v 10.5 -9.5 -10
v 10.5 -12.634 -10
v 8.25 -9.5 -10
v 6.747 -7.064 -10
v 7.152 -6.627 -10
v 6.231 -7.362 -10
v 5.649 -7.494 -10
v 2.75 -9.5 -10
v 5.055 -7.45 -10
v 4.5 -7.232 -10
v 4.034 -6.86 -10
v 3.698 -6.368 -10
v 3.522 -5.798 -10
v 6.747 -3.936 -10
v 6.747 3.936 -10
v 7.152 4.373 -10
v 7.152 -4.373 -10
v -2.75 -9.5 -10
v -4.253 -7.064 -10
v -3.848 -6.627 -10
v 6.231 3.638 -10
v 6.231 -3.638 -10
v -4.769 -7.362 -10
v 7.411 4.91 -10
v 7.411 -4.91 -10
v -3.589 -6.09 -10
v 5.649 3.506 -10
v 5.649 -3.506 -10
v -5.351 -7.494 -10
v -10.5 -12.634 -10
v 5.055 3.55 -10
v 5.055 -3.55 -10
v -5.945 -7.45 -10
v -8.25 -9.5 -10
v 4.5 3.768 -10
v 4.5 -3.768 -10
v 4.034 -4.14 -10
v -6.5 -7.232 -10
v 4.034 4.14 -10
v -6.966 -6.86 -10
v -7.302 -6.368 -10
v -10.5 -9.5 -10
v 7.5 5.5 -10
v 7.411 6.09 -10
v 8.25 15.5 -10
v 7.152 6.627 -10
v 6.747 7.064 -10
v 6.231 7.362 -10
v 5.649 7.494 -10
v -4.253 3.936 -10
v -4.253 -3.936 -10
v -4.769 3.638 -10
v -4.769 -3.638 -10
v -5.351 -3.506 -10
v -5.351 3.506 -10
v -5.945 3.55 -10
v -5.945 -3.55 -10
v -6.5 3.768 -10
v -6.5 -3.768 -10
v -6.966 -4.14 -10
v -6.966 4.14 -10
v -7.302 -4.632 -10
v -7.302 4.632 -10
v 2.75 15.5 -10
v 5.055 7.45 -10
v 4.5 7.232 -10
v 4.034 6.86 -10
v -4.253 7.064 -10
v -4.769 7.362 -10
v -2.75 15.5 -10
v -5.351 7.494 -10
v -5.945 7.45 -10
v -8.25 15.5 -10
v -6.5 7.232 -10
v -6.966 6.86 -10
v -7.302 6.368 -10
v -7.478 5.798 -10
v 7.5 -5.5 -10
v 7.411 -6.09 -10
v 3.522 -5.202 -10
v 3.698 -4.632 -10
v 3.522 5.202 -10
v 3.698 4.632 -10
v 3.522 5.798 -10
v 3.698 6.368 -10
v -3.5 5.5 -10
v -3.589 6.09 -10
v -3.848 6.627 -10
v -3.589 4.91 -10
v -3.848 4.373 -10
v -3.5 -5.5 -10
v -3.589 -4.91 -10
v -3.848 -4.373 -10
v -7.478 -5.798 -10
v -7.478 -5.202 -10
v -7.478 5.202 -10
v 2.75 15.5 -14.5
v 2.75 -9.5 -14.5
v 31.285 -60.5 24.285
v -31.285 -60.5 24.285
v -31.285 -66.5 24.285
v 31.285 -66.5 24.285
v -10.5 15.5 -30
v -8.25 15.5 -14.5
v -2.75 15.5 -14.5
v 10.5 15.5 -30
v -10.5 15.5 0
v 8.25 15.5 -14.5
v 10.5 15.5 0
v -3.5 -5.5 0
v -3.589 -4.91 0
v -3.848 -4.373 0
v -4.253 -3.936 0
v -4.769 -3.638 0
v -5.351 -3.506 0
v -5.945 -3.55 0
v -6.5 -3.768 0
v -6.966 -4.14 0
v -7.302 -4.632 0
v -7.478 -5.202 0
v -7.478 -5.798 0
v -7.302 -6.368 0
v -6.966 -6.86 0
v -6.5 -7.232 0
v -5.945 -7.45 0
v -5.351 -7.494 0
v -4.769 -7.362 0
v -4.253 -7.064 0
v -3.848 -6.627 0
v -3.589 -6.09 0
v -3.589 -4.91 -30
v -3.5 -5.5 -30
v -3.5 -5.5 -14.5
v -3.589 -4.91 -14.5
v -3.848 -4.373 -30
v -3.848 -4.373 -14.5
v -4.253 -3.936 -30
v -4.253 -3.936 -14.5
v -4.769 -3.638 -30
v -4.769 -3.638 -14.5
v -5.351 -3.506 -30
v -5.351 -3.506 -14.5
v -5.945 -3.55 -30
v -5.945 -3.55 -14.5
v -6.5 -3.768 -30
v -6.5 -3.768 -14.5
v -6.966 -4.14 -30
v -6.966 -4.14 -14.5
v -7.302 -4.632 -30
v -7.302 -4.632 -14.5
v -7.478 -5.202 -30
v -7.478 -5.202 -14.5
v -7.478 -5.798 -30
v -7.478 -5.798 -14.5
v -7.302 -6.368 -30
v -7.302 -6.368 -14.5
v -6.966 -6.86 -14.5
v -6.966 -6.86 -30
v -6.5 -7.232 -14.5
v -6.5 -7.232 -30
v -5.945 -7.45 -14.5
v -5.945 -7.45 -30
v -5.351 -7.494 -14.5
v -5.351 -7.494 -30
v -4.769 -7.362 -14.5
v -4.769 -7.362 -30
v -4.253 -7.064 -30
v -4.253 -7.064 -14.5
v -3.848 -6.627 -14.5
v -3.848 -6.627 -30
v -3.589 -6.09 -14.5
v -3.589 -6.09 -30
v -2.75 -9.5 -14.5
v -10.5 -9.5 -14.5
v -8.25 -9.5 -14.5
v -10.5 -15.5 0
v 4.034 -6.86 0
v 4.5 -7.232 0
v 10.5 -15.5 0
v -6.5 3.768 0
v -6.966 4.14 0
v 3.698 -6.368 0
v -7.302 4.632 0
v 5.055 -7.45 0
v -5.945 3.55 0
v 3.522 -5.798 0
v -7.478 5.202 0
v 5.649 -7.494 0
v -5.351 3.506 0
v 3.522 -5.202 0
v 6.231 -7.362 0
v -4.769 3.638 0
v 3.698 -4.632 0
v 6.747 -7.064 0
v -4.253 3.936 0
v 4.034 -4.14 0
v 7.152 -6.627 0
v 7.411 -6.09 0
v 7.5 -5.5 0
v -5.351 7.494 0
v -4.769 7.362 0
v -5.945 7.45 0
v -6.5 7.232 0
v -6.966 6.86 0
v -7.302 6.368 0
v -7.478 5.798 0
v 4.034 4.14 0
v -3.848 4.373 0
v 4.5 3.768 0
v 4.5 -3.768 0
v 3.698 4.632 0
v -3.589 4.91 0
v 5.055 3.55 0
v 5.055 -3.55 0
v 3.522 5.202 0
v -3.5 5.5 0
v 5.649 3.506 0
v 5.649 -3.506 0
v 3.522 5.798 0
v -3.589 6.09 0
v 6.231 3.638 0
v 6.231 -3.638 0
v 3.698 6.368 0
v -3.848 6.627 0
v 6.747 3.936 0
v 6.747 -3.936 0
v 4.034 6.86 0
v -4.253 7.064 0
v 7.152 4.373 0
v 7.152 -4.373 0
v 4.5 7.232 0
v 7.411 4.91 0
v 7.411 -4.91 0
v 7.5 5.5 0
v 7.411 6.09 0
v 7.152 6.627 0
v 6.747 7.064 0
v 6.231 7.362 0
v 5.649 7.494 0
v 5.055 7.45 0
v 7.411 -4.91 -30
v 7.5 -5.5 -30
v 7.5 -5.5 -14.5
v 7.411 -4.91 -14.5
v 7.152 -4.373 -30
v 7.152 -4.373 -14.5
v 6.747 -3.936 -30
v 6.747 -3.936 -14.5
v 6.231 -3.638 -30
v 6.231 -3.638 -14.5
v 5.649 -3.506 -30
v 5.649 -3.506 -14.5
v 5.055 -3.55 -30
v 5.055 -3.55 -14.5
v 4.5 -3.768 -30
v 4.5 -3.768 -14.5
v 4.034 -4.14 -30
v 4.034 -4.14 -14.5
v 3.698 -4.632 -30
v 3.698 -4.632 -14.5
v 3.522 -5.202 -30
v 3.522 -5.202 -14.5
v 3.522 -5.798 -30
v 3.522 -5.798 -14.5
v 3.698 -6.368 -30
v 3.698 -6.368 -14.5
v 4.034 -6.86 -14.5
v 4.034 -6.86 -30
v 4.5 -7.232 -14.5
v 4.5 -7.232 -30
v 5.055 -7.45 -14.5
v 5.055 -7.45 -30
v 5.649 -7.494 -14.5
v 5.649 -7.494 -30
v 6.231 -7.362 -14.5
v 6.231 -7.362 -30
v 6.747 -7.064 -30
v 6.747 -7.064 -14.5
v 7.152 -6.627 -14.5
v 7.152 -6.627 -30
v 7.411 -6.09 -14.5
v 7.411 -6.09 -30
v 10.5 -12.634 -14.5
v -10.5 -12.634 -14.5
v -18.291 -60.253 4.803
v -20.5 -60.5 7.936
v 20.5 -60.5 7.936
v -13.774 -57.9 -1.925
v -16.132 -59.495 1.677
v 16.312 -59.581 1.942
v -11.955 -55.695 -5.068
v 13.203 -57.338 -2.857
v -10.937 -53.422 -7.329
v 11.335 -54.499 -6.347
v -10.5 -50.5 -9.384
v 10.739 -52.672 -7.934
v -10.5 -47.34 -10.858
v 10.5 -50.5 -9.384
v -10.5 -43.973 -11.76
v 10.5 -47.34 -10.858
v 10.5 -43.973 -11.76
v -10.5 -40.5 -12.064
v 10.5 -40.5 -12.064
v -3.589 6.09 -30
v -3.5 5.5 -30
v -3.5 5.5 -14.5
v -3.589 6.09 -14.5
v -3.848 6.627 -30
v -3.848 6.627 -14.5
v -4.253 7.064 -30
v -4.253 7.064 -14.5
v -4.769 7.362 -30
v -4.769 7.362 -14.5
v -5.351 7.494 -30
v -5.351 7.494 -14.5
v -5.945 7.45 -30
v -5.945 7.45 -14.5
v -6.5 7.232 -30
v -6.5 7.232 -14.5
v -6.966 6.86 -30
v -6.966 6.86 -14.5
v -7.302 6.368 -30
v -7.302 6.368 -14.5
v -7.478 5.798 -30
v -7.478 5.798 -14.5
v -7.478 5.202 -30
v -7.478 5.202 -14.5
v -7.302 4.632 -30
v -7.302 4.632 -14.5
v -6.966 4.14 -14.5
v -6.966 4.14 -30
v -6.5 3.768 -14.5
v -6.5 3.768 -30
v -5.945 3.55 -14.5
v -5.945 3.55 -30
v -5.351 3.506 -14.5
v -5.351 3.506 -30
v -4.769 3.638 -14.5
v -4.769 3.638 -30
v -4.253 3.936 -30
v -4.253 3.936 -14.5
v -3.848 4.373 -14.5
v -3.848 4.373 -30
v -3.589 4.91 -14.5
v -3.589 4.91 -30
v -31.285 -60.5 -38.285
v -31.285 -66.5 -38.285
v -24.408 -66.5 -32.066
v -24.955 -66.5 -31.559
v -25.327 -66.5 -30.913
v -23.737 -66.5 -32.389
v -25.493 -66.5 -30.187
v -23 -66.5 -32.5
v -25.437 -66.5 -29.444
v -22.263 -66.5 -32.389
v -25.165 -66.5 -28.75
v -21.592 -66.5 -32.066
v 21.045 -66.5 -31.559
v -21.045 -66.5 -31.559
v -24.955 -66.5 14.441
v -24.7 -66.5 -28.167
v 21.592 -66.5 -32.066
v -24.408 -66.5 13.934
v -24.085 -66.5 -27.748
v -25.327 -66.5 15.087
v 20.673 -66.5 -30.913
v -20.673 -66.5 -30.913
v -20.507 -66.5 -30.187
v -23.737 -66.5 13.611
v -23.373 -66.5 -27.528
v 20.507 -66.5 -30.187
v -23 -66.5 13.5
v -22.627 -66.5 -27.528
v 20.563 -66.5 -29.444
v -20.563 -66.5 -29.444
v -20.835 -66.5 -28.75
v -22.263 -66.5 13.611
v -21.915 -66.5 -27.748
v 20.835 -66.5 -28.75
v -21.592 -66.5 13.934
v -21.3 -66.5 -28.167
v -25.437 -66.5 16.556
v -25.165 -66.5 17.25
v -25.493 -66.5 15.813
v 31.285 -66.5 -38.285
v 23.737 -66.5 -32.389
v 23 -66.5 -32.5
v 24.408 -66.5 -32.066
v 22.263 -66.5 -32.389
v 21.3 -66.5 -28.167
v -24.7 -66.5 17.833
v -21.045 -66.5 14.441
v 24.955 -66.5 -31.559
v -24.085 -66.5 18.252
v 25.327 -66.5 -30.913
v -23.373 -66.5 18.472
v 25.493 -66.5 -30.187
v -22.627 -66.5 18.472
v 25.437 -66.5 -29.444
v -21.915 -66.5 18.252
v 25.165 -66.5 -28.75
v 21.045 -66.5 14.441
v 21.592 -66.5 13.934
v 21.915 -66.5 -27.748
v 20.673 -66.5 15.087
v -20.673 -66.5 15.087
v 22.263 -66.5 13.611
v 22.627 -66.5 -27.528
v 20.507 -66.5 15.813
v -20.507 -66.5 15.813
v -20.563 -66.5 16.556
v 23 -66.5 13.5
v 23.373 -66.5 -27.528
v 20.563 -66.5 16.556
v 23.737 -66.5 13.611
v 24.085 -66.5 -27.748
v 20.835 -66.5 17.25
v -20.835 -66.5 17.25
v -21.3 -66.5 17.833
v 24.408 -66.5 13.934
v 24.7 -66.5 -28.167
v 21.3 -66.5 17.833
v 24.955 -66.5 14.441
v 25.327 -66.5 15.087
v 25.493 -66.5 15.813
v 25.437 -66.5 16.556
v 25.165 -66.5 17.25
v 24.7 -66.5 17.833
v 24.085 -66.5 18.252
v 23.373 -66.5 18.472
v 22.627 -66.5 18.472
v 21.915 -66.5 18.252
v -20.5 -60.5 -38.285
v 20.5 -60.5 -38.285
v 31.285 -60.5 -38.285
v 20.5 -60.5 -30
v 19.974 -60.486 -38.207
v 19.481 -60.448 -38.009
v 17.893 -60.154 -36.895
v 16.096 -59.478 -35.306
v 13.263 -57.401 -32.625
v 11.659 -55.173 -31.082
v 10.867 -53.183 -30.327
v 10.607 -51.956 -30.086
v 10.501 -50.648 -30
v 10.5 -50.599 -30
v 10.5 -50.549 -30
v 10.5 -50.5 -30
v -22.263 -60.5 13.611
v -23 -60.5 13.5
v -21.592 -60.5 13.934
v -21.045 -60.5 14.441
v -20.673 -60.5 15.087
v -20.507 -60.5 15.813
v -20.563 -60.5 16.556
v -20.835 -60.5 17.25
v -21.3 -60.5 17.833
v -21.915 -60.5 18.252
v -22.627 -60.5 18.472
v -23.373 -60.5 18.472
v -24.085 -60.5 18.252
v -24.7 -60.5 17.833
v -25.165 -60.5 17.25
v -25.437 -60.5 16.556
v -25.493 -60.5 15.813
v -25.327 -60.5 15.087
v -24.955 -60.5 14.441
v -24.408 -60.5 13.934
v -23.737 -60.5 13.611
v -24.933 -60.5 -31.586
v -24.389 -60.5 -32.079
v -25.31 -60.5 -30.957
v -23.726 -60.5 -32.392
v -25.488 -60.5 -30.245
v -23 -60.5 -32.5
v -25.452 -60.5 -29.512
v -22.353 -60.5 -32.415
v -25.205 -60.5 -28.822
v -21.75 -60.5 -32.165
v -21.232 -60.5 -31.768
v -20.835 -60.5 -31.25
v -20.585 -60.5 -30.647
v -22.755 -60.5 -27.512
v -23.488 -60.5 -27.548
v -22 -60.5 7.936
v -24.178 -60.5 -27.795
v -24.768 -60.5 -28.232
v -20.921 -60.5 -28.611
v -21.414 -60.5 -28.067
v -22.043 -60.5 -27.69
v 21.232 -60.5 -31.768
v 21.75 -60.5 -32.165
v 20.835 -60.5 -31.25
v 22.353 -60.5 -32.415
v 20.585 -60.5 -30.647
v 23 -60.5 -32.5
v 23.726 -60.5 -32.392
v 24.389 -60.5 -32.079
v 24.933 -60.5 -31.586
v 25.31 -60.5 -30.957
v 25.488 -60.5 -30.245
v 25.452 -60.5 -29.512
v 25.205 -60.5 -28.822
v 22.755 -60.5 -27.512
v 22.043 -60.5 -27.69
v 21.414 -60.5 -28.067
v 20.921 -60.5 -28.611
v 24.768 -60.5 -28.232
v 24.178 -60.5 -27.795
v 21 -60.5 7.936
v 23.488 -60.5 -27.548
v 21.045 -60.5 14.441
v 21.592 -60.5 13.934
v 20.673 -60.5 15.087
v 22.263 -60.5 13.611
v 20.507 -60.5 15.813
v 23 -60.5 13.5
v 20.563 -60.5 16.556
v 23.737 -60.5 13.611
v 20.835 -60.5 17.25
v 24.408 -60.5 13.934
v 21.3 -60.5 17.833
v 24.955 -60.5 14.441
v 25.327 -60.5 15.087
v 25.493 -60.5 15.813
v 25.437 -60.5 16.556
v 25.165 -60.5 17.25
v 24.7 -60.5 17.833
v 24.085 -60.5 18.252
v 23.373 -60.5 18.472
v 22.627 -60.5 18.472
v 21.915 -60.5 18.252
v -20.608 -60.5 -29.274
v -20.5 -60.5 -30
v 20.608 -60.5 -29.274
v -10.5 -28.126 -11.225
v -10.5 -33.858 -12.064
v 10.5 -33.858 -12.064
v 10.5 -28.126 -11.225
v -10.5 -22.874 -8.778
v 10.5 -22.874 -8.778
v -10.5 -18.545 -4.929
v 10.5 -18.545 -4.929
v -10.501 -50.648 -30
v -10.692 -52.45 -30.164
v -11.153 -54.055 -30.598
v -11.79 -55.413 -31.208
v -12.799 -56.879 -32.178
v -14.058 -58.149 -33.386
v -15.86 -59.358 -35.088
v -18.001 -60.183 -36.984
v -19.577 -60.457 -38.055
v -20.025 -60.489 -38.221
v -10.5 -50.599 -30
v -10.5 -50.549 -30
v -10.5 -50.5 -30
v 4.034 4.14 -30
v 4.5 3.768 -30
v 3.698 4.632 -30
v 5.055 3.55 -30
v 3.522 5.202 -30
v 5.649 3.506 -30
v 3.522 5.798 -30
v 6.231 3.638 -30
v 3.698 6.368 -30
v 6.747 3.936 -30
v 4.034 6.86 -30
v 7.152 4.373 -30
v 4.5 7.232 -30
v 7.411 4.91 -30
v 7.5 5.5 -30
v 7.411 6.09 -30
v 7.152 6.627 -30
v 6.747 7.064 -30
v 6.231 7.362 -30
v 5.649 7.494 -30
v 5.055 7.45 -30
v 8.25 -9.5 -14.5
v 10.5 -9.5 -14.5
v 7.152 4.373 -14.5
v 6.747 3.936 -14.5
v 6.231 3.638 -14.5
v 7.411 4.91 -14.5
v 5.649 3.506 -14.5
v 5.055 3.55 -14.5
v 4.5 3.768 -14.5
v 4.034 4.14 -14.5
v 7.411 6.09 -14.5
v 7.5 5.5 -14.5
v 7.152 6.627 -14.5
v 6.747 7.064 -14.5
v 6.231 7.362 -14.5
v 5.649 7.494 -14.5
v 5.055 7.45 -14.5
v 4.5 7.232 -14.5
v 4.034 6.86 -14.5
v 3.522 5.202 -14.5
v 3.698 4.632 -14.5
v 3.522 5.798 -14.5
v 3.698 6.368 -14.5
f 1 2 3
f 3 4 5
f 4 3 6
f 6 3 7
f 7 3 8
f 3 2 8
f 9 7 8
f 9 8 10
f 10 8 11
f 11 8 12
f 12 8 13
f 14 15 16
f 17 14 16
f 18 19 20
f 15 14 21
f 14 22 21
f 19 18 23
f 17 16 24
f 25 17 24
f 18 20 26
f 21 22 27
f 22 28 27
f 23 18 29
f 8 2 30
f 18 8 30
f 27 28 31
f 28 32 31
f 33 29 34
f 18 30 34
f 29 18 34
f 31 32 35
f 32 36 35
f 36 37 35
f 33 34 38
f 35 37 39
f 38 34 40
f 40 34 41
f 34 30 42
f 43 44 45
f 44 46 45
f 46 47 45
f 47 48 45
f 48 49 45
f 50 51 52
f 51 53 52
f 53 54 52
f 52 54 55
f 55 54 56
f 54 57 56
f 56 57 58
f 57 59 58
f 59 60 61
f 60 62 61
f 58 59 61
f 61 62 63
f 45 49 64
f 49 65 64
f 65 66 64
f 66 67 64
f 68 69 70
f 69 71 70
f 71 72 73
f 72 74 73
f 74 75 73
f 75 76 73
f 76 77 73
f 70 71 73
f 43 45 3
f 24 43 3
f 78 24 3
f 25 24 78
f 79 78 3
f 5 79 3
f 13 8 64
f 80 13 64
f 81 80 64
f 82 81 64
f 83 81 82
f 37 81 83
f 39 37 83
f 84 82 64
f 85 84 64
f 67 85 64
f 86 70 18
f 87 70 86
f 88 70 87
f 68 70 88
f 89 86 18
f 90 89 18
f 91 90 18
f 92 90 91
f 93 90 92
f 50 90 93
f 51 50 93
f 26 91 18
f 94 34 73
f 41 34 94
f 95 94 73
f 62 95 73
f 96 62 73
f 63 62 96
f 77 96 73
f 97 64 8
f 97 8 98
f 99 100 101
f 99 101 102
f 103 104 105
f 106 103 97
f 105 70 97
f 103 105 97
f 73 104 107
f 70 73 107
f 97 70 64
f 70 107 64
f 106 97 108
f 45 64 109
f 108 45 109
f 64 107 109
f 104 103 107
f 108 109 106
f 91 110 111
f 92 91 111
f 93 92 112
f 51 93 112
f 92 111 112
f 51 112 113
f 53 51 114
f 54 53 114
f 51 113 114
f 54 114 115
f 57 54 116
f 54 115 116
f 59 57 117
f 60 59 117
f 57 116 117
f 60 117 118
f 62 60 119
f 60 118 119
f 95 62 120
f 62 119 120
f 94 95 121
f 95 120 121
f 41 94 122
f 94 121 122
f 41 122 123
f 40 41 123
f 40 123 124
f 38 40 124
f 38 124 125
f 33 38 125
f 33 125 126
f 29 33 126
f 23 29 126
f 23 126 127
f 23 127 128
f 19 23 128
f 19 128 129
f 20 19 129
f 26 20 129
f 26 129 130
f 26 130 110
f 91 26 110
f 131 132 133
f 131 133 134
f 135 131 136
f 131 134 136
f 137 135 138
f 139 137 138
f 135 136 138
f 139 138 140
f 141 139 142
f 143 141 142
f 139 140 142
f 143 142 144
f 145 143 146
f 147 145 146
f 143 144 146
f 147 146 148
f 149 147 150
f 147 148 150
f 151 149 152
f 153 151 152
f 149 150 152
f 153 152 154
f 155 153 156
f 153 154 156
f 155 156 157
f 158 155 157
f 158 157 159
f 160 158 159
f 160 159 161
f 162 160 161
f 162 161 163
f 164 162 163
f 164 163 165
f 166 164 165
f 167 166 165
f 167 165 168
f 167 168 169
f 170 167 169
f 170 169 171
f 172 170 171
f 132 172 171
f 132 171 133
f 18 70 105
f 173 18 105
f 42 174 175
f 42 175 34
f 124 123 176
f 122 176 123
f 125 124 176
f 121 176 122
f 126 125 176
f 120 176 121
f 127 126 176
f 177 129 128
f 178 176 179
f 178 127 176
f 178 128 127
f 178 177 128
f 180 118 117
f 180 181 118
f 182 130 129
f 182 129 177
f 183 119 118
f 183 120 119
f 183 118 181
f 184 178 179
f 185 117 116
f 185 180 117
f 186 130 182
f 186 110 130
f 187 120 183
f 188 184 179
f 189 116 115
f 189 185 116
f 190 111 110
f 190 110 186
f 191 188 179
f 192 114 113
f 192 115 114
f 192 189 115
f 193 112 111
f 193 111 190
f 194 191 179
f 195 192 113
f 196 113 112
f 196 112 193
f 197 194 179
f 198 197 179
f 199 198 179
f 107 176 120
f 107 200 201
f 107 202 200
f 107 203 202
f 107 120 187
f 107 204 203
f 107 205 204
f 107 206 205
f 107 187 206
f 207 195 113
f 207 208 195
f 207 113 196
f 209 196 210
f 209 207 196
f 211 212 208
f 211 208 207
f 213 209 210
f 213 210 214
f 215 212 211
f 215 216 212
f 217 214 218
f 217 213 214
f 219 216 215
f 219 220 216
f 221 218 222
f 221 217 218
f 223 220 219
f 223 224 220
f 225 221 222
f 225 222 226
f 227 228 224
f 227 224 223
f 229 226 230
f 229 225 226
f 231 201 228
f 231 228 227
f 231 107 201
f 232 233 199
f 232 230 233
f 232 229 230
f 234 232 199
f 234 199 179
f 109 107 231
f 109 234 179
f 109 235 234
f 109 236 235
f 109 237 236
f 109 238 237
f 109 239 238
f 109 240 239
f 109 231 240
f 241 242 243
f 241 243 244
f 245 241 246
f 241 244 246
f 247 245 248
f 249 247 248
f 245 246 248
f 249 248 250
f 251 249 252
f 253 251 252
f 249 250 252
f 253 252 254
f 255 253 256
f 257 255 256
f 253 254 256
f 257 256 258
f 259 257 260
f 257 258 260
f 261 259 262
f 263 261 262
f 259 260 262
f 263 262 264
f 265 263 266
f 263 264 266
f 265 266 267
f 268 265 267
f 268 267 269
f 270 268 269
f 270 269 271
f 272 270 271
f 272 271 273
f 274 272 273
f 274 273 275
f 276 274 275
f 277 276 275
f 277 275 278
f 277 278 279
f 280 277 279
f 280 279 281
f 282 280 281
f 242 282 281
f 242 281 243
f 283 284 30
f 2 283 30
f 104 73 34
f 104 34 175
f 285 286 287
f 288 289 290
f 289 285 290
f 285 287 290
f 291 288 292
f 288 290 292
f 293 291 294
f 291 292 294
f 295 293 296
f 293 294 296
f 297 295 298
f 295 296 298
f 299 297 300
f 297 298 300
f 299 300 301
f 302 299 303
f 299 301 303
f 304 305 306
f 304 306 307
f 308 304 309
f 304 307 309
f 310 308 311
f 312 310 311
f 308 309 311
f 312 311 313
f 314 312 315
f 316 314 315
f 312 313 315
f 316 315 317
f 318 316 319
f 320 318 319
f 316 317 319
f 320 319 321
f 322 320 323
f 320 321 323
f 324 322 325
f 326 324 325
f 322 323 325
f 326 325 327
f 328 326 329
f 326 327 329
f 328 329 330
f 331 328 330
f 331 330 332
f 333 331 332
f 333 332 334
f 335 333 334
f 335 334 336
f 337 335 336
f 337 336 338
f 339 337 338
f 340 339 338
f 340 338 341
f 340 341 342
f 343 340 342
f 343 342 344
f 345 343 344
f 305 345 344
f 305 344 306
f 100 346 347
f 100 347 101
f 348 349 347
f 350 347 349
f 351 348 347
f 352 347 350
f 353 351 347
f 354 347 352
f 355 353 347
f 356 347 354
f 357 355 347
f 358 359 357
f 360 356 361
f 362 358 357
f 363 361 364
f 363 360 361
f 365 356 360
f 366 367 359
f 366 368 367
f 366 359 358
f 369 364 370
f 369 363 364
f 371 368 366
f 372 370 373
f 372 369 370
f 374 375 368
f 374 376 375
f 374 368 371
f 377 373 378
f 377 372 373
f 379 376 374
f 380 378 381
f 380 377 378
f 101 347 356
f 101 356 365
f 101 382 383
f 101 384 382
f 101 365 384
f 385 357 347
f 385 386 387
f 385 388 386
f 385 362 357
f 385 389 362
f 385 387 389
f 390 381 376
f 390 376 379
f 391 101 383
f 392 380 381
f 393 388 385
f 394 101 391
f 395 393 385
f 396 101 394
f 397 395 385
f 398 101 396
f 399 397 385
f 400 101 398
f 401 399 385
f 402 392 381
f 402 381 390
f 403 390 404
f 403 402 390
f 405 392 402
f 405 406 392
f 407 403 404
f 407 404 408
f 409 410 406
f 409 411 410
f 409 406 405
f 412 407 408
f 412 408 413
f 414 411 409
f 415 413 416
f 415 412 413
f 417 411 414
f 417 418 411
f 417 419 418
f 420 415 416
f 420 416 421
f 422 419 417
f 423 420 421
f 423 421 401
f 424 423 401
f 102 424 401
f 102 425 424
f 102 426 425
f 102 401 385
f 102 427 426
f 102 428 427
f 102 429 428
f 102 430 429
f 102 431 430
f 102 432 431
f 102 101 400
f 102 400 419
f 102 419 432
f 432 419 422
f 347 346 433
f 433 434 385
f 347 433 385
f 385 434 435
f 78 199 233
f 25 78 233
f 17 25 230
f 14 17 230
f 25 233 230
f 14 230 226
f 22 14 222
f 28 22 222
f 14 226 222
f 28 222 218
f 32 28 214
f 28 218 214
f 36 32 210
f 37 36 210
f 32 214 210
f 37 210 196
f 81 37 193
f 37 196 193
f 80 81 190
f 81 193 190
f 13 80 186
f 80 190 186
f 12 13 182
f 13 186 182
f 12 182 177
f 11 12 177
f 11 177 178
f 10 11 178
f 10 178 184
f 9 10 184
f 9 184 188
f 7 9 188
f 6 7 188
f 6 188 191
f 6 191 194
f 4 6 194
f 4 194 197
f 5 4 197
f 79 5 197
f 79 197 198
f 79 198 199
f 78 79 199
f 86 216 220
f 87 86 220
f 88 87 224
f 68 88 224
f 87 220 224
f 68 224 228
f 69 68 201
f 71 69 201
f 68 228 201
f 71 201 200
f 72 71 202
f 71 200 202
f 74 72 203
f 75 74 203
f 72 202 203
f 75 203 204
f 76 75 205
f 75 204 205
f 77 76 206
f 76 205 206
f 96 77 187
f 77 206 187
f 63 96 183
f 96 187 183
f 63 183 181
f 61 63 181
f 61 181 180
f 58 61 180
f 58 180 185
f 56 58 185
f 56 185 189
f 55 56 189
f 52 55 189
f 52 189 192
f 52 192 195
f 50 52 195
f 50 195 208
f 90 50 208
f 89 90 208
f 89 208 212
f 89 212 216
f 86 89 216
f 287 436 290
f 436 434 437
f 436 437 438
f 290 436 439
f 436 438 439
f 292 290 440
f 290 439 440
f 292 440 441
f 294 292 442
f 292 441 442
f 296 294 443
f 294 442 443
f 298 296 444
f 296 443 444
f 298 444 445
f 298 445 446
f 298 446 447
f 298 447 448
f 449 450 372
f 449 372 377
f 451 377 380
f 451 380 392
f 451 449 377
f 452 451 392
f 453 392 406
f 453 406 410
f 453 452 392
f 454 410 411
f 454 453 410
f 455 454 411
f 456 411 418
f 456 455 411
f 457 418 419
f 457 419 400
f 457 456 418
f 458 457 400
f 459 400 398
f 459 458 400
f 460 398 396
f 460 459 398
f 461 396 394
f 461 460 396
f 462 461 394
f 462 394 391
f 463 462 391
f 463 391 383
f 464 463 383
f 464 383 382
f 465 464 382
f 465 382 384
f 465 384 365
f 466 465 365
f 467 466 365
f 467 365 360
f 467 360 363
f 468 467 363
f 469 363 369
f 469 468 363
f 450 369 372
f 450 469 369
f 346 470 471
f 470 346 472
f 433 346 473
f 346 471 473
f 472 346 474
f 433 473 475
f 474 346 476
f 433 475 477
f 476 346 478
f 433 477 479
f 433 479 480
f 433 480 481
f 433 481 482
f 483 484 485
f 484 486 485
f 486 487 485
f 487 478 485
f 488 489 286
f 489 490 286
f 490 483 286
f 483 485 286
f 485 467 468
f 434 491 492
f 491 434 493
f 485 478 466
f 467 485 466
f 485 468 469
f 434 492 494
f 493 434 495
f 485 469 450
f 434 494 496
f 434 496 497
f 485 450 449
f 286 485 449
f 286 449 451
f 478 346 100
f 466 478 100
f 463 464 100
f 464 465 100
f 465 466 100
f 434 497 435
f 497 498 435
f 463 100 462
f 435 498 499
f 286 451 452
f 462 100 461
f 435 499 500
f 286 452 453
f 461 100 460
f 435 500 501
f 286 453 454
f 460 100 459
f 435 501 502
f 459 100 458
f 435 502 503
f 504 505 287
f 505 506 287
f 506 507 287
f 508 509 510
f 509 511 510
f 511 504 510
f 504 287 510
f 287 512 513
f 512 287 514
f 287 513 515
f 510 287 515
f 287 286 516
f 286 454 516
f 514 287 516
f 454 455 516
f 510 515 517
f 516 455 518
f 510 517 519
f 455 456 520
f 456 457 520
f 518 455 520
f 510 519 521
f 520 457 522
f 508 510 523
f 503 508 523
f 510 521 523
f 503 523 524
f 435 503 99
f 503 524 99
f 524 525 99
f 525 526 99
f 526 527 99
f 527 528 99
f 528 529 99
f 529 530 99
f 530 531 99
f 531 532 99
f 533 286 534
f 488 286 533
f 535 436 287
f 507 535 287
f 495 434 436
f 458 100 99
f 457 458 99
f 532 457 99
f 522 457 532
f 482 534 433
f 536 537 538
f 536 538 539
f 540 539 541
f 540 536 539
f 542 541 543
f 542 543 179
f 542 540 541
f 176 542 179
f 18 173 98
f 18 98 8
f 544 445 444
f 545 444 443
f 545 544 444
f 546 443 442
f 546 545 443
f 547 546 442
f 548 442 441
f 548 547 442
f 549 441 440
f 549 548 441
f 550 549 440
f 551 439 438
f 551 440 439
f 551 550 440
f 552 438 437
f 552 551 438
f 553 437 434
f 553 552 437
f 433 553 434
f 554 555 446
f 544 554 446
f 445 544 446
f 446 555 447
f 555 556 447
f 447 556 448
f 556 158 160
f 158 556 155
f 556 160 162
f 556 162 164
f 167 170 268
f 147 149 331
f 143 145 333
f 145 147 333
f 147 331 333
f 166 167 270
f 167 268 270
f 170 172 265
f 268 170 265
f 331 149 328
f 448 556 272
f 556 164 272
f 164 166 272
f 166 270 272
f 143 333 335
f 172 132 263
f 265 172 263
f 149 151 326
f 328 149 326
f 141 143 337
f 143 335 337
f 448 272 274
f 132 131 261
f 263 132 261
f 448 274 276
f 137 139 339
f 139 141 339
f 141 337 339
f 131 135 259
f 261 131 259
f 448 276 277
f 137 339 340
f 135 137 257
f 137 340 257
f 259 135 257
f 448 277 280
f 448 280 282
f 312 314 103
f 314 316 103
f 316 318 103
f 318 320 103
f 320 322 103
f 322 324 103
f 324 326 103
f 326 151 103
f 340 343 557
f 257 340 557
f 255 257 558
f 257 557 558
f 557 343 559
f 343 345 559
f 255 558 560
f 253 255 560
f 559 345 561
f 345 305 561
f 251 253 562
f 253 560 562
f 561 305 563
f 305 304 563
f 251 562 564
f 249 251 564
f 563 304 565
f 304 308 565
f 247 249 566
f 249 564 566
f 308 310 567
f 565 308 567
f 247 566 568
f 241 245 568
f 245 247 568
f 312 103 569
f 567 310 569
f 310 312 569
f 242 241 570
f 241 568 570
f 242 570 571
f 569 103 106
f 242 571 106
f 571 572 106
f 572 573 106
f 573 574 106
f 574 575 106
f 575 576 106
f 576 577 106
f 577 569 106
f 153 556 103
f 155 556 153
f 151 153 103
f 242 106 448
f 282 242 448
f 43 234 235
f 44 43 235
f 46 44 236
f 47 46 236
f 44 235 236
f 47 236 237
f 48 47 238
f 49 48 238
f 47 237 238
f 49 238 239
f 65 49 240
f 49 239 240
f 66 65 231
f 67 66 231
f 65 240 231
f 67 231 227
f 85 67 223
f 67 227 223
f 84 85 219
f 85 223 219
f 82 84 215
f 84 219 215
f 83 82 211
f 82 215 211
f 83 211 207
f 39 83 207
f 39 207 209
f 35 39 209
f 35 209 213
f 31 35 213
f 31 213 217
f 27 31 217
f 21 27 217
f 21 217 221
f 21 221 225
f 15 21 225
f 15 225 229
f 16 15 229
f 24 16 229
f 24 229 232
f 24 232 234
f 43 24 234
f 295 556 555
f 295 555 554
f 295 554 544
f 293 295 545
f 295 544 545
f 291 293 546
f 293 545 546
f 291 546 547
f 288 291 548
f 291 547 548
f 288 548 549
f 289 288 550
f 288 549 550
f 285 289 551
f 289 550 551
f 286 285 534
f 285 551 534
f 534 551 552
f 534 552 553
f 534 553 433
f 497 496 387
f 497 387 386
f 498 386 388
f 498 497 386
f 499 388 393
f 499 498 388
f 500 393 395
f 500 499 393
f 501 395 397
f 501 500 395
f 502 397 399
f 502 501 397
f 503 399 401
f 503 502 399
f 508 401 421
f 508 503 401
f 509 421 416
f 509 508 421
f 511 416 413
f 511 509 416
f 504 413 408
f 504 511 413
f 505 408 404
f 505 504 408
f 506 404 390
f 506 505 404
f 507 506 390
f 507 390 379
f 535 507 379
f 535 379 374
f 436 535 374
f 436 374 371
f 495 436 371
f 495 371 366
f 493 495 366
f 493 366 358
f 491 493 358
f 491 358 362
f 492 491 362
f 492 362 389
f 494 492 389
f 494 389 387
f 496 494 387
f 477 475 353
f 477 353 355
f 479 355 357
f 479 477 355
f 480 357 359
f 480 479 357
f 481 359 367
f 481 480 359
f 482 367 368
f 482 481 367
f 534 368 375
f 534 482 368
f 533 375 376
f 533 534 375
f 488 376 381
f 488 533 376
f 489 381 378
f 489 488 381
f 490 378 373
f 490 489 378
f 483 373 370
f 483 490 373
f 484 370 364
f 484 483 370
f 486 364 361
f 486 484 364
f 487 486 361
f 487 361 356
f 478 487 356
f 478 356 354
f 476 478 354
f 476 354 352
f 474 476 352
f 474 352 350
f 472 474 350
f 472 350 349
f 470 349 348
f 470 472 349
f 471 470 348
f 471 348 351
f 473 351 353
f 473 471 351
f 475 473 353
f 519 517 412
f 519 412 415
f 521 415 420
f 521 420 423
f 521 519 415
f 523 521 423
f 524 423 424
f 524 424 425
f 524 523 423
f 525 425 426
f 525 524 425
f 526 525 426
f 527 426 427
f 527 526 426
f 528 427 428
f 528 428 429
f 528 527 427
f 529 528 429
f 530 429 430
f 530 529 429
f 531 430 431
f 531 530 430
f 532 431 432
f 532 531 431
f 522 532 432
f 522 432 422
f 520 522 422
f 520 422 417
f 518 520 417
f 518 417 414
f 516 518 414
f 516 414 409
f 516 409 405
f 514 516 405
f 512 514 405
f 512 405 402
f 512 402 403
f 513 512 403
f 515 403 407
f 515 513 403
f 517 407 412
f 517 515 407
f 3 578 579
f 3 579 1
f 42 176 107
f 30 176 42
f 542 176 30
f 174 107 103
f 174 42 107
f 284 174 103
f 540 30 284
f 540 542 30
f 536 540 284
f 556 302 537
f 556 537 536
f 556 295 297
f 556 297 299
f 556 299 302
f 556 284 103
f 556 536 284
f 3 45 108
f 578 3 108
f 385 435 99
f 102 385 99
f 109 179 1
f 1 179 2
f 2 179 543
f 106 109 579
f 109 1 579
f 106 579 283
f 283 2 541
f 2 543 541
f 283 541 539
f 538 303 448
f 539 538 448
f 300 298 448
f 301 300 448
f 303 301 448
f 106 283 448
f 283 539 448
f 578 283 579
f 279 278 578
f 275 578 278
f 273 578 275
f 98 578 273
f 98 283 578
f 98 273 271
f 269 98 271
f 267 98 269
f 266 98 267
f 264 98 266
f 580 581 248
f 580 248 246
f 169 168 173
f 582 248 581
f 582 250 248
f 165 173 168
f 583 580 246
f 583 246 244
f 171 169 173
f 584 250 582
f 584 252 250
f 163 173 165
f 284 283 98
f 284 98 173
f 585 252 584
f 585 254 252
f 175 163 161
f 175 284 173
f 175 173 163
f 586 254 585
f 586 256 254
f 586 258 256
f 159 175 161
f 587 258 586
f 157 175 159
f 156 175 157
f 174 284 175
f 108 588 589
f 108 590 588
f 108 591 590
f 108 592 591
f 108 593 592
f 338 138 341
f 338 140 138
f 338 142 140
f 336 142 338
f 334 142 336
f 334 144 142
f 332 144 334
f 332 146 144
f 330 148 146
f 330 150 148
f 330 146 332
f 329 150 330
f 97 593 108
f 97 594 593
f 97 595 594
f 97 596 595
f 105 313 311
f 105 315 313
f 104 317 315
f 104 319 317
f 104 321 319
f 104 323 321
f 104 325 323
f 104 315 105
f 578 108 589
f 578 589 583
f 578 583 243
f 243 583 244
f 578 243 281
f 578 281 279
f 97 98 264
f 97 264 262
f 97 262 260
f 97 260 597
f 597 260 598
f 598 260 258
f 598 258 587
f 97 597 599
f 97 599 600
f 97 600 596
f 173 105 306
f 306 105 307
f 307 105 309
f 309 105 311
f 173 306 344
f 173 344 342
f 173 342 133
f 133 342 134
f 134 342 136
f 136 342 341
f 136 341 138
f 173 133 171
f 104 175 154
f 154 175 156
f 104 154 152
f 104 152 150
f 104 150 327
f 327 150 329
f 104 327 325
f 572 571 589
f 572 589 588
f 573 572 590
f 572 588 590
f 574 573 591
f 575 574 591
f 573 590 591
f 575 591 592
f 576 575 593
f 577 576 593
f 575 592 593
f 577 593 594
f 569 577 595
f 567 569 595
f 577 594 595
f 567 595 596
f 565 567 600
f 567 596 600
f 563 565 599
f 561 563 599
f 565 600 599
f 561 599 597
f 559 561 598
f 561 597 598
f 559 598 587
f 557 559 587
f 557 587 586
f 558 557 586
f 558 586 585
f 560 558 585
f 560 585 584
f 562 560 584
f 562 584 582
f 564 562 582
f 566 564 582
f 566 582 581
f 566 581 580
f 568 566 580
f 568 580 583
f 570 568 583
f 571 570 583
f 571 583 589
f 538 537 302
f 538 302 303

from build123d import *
from OCP.BRepAlgoAPI import BRepAlgoAPI_Cut
from OCP.TopTools import TopTools_ListOfShape

# Parameters (mm, degrees)
SKETCH1_W           = 21
SKETCH1_H           = 31
BOSS_EXTRUDE1_DEPTH = 30
SKETCH2_W           = 21
SKETCH2_H           = 17.936176812
BOSS_EXTRUDE2_DEPTH = 45
SKETCH6_R           = 2
CUT_EXTRUDE1_DEPTH  = 30
SKETCH8_W           = 62.569062922
SKETCH8_H           = 62.569062922
SKETCH8_R           = 2.5
BOSS_EXTRUDE6_DEPTH = 6
FILLET1_R           = 20
FILLET2_R           = 20
FILLET3_START       = -10.5
FILLET3_DEPTH       = 21
FILLET3_START_2     = -38.284535634
FILLET3_2_DEPTH     = 46.220712446
FILLET3_START_3     = -22
FILLET3_3_DEPTH     = 43
SKETCH9_W           = 5.5
SKETCH9_H           = 4.5
CUT_EXTRUDE2_DEPTH  = 25
SKETCH10_W          = 4.5
SKETCH10_H          = 3.134245462
CUT_EXTRUDE3_DEPTH  = 25


with BuildPart() as part:
    # Sketch1 → Boss-Extrude1 (new body)
    with BuildSketch(Plane.XY):
        Rectangle(SKETCH1_W, SKETCH1_H)
    extrude(amount=-BOSS_EXTRUDE1_DEPTH)

    # Sketch2 → Boss-Extrude2 (add)
    with BuildSketch(Plane.XZ.offset(15.5)):
        with Locations((0, -21.031911594)):
            Rectangle(SKETCH2_W, SKETCH2_H)
    extrude(amount=BOSS_EXTRUDE2_DEPTH)

    # Sketch6 → Cut-Extrude1 (cut)
    with BuildSketch(Plane.XY):
        with Locations((5.5, 5.5)):
            Circle(SKETCH6_R)
        with Locations((5.5, -5.5)):
            Circle(SKETCH6_R)
        with Locations((-5.5, -5.5)):
            Circle(SKETCH6_R)
        with Locations((-5.5, 5.5)):
            Circle(SKETCH6_R)
    extrude(amount=-CUT_EXTRUDE1_DEPTH, mode=Mode.SUBTRACT)

    # Sketch8 → Boss-Extrude6 (add)
    with BuildSketch(Plane.XZ.offset(60.5)):
        with Locations((0, -7)):
            Rectangle(SKETCH8_W, SKETCH8_H)
        with Locations(Location((23, 16, 0), (0, 0, 270))):
            Circle(SKETCH8_R, mode=Mode.SUBTRACT)
        with Locations(Location((23, -30, 0), (0, 0, 270))):
            Circle(SKETCH8_R, mode=Mode.SUBTRACT)
        with Locations(Location((-23, -30, 0), (0, 0, 270))):
            Circle(SKETCH8_R, mode=Mode.SUBTRACT)
        with Locations(Location((-23, 16, 0), (0, 0, 270))):
            Circle(SKETCH8_R, mode=Mode.SUBTRACT)
    extrude(amount=BOSS_EXTRUDE6_DEPTH)

    # Fillet1
    fillet1_edges = [part.edges().sort_by_distance(p)[0] for p in [
        (0, -60.5, -12.063823188),
    ]]
    fillet(fillet1_edges, radius=FILLET1_R)

    # Fillet2
    # the kernel refuses this fillet: 20 mm, written as the material it adds along each edge
    with BuildSketch(Plane(origin=(-10.5, -15.5, -12.063823188), x_dir=(0, 0, 1), z_dir=(1, 0, 0))) as fillet2_piece_1:
        with BuildLine():
            CenterArc((20, 18.358025428), FILLET2_R, 180, 66.621165334)
            Line((0, 18.358025428), (-0.4, 18.358025428))
            Line((-0.4, 18.358025428), (-0.4, 0))
            Line((-0.4, 0), (0, -0.4))
            ThreePointArc((0, -0.4), (6.031911594, -0.4), (11.905099651, -0.367160509))
            Line((11.905099651, -0.367160509), (12.063823188, 0))
        make_face()
    extrude(amount=21)


with BuildPart() as fillet3_tool:
    # Fillet3: read off the stored shape, not the designer's step
    # Fillet3 outline → Fillet3 (new body)
    with BuildSketch(Plane.YZ.offset(FILLET3_START)):
        with BuildLine():
            ThreePointArc((-60.5, -38.284531461), (-57.084283982, -32.34641635), (-50.648240376, -30))
            Line((-50.648240376, -30), (-60.5, -30))
            Line((-60.5, -30), (-60.5, -38.284531461))
        make_face()
    extrude(amount=FILLET3_DEPTH)


with BuildPart() as part_1:
    add(part.part)


with BuildPart() as part_2:
    # Fillet3: joined with fillet3_tool
    add(part_1.part.fuse(fillet3_tool.part, tol=0.00001))


with BuildPart() as fillet3_2_tool:
    # Fillet3 2 outline → Fillet3 2 (new body)
    with BuildSketch(Plane.XY.offset(FILLET3_START_2)):
        with BuildLine():
            Line((10.5, -50.5), (10.5, -60.5))
            Line((10.5, -60.5), (20.5, -60.5))
            ThreePointArc((20.5, -60.5), (13.428932188, -57.571067812), (10.5, -50.5))
        make_face()
        with BuildLine():
            ThreePointArc((-10.5, -50.5), (-13.428932188, -57.571067812), (-20.5, -60.5))
            Line((-20.5, -60.5), (-10.5, -60.5))
            Line((-10.5, -60.5), (-10.5, -50.5))
        make_face()
    extrude(amount=FILLET3_2_DEPTH)


with BuildPart() as part_3:
    add(part_2.part)


with BuildPart() as part_4:
    # Fillet3 2: joined with fillet3_2_tool
    add(part_3.part.fuse(fillet3_2_tool.part, tol=0.00001))


with BuildPart() as fillet3_3_tool:
    # Fillet3 3 outline → Fillet3 3 (new body)
    with BuildSketch(Plane.YZ.offset(FILLET3_START_3)):
        with BuildLine():
            ThreePointArc((-50.648240376, -30), (-57.084283982, -32.34641635), (-60.5, -38.284531461))
            Line((-60.5, -38.284531461), (-50.5, -38.284535634))
            Line((-50.5, -38.284535634), (-50.5, -30))
            Line((-50.5, -30), (-50.648240376, -30))
        make_face()
        with BuildLine():
            Line((-50.5, 7.936176812), (-60.5, 7.936176812))
            ThreePointArc((-60.5, 7.936176812), (-57.820508076, -2.063823188), (-50.5, -9.384331263))
            Line((-50.5, -9.384331263), (-50.5, 7.936176812))
        make_face()
    extrude(amount=FILLET3_3_DEPTH)


with BuildPart() as part_5:
    add(part_4.part)

    # Fillet3 3: cut by fillet3_3_tool, with a tolerance
    fillet3_3_stock = TopTools_ListOfShape()
    fillet3_3_stock.Append(part_5.part.wrapped)
    fillet3_3_tools = TopTools_ListOfShape()
    fillet3_3_tools.Append(fillet3_3_tool.part.wrapped)
    fillet3_3_cut = BRepAlgoAPI_Cut()
    fillet3_3_cut.SetArguments(fillet3_3_stock)
    fillet3_3_cut.SetTools(fillet3_3_tools)
    fillet3_3_cut.SetFuzzyValue(0.00001)
    fillet3_3_cut.Build()
    add(Compound.cast(fillet3_3_cut.Shape()).solids(), mode=Mode.REPLACE)

    # Sketch9 → Cut-Extrude2 (cut)
    with BuildSketch(Plane(origin=(0, 15.5, 0), x_dir=(1, 0, 0), z_dir=(0, 1, 0))):
        with Locations((-5.5, 12.25)):
            Rectangle(SKETCH9_W, SKETCH9_H)
        with Locations((5.5, 12.25)):
            Rectangle(SKETCH9_W, SKETCH9_H)
    extrude(amount=-CUT_EXTRUDE2_DEPTH, mode=Mode.SUBTRACT)

    # Sketch10 → Cut-Extrude3 (cut)
    with BuildSketch(Plane.ZY.offset(10.5)):
        with Locations((-12.25, -11.067122731)):
            Rectangle(SKETCH10_W, SKETCH10_H)
    extrude(amount=-CUT_EXTRUDE3_DEPTH, mode=Mode.SUBTRACT)


solid = part_5.part
